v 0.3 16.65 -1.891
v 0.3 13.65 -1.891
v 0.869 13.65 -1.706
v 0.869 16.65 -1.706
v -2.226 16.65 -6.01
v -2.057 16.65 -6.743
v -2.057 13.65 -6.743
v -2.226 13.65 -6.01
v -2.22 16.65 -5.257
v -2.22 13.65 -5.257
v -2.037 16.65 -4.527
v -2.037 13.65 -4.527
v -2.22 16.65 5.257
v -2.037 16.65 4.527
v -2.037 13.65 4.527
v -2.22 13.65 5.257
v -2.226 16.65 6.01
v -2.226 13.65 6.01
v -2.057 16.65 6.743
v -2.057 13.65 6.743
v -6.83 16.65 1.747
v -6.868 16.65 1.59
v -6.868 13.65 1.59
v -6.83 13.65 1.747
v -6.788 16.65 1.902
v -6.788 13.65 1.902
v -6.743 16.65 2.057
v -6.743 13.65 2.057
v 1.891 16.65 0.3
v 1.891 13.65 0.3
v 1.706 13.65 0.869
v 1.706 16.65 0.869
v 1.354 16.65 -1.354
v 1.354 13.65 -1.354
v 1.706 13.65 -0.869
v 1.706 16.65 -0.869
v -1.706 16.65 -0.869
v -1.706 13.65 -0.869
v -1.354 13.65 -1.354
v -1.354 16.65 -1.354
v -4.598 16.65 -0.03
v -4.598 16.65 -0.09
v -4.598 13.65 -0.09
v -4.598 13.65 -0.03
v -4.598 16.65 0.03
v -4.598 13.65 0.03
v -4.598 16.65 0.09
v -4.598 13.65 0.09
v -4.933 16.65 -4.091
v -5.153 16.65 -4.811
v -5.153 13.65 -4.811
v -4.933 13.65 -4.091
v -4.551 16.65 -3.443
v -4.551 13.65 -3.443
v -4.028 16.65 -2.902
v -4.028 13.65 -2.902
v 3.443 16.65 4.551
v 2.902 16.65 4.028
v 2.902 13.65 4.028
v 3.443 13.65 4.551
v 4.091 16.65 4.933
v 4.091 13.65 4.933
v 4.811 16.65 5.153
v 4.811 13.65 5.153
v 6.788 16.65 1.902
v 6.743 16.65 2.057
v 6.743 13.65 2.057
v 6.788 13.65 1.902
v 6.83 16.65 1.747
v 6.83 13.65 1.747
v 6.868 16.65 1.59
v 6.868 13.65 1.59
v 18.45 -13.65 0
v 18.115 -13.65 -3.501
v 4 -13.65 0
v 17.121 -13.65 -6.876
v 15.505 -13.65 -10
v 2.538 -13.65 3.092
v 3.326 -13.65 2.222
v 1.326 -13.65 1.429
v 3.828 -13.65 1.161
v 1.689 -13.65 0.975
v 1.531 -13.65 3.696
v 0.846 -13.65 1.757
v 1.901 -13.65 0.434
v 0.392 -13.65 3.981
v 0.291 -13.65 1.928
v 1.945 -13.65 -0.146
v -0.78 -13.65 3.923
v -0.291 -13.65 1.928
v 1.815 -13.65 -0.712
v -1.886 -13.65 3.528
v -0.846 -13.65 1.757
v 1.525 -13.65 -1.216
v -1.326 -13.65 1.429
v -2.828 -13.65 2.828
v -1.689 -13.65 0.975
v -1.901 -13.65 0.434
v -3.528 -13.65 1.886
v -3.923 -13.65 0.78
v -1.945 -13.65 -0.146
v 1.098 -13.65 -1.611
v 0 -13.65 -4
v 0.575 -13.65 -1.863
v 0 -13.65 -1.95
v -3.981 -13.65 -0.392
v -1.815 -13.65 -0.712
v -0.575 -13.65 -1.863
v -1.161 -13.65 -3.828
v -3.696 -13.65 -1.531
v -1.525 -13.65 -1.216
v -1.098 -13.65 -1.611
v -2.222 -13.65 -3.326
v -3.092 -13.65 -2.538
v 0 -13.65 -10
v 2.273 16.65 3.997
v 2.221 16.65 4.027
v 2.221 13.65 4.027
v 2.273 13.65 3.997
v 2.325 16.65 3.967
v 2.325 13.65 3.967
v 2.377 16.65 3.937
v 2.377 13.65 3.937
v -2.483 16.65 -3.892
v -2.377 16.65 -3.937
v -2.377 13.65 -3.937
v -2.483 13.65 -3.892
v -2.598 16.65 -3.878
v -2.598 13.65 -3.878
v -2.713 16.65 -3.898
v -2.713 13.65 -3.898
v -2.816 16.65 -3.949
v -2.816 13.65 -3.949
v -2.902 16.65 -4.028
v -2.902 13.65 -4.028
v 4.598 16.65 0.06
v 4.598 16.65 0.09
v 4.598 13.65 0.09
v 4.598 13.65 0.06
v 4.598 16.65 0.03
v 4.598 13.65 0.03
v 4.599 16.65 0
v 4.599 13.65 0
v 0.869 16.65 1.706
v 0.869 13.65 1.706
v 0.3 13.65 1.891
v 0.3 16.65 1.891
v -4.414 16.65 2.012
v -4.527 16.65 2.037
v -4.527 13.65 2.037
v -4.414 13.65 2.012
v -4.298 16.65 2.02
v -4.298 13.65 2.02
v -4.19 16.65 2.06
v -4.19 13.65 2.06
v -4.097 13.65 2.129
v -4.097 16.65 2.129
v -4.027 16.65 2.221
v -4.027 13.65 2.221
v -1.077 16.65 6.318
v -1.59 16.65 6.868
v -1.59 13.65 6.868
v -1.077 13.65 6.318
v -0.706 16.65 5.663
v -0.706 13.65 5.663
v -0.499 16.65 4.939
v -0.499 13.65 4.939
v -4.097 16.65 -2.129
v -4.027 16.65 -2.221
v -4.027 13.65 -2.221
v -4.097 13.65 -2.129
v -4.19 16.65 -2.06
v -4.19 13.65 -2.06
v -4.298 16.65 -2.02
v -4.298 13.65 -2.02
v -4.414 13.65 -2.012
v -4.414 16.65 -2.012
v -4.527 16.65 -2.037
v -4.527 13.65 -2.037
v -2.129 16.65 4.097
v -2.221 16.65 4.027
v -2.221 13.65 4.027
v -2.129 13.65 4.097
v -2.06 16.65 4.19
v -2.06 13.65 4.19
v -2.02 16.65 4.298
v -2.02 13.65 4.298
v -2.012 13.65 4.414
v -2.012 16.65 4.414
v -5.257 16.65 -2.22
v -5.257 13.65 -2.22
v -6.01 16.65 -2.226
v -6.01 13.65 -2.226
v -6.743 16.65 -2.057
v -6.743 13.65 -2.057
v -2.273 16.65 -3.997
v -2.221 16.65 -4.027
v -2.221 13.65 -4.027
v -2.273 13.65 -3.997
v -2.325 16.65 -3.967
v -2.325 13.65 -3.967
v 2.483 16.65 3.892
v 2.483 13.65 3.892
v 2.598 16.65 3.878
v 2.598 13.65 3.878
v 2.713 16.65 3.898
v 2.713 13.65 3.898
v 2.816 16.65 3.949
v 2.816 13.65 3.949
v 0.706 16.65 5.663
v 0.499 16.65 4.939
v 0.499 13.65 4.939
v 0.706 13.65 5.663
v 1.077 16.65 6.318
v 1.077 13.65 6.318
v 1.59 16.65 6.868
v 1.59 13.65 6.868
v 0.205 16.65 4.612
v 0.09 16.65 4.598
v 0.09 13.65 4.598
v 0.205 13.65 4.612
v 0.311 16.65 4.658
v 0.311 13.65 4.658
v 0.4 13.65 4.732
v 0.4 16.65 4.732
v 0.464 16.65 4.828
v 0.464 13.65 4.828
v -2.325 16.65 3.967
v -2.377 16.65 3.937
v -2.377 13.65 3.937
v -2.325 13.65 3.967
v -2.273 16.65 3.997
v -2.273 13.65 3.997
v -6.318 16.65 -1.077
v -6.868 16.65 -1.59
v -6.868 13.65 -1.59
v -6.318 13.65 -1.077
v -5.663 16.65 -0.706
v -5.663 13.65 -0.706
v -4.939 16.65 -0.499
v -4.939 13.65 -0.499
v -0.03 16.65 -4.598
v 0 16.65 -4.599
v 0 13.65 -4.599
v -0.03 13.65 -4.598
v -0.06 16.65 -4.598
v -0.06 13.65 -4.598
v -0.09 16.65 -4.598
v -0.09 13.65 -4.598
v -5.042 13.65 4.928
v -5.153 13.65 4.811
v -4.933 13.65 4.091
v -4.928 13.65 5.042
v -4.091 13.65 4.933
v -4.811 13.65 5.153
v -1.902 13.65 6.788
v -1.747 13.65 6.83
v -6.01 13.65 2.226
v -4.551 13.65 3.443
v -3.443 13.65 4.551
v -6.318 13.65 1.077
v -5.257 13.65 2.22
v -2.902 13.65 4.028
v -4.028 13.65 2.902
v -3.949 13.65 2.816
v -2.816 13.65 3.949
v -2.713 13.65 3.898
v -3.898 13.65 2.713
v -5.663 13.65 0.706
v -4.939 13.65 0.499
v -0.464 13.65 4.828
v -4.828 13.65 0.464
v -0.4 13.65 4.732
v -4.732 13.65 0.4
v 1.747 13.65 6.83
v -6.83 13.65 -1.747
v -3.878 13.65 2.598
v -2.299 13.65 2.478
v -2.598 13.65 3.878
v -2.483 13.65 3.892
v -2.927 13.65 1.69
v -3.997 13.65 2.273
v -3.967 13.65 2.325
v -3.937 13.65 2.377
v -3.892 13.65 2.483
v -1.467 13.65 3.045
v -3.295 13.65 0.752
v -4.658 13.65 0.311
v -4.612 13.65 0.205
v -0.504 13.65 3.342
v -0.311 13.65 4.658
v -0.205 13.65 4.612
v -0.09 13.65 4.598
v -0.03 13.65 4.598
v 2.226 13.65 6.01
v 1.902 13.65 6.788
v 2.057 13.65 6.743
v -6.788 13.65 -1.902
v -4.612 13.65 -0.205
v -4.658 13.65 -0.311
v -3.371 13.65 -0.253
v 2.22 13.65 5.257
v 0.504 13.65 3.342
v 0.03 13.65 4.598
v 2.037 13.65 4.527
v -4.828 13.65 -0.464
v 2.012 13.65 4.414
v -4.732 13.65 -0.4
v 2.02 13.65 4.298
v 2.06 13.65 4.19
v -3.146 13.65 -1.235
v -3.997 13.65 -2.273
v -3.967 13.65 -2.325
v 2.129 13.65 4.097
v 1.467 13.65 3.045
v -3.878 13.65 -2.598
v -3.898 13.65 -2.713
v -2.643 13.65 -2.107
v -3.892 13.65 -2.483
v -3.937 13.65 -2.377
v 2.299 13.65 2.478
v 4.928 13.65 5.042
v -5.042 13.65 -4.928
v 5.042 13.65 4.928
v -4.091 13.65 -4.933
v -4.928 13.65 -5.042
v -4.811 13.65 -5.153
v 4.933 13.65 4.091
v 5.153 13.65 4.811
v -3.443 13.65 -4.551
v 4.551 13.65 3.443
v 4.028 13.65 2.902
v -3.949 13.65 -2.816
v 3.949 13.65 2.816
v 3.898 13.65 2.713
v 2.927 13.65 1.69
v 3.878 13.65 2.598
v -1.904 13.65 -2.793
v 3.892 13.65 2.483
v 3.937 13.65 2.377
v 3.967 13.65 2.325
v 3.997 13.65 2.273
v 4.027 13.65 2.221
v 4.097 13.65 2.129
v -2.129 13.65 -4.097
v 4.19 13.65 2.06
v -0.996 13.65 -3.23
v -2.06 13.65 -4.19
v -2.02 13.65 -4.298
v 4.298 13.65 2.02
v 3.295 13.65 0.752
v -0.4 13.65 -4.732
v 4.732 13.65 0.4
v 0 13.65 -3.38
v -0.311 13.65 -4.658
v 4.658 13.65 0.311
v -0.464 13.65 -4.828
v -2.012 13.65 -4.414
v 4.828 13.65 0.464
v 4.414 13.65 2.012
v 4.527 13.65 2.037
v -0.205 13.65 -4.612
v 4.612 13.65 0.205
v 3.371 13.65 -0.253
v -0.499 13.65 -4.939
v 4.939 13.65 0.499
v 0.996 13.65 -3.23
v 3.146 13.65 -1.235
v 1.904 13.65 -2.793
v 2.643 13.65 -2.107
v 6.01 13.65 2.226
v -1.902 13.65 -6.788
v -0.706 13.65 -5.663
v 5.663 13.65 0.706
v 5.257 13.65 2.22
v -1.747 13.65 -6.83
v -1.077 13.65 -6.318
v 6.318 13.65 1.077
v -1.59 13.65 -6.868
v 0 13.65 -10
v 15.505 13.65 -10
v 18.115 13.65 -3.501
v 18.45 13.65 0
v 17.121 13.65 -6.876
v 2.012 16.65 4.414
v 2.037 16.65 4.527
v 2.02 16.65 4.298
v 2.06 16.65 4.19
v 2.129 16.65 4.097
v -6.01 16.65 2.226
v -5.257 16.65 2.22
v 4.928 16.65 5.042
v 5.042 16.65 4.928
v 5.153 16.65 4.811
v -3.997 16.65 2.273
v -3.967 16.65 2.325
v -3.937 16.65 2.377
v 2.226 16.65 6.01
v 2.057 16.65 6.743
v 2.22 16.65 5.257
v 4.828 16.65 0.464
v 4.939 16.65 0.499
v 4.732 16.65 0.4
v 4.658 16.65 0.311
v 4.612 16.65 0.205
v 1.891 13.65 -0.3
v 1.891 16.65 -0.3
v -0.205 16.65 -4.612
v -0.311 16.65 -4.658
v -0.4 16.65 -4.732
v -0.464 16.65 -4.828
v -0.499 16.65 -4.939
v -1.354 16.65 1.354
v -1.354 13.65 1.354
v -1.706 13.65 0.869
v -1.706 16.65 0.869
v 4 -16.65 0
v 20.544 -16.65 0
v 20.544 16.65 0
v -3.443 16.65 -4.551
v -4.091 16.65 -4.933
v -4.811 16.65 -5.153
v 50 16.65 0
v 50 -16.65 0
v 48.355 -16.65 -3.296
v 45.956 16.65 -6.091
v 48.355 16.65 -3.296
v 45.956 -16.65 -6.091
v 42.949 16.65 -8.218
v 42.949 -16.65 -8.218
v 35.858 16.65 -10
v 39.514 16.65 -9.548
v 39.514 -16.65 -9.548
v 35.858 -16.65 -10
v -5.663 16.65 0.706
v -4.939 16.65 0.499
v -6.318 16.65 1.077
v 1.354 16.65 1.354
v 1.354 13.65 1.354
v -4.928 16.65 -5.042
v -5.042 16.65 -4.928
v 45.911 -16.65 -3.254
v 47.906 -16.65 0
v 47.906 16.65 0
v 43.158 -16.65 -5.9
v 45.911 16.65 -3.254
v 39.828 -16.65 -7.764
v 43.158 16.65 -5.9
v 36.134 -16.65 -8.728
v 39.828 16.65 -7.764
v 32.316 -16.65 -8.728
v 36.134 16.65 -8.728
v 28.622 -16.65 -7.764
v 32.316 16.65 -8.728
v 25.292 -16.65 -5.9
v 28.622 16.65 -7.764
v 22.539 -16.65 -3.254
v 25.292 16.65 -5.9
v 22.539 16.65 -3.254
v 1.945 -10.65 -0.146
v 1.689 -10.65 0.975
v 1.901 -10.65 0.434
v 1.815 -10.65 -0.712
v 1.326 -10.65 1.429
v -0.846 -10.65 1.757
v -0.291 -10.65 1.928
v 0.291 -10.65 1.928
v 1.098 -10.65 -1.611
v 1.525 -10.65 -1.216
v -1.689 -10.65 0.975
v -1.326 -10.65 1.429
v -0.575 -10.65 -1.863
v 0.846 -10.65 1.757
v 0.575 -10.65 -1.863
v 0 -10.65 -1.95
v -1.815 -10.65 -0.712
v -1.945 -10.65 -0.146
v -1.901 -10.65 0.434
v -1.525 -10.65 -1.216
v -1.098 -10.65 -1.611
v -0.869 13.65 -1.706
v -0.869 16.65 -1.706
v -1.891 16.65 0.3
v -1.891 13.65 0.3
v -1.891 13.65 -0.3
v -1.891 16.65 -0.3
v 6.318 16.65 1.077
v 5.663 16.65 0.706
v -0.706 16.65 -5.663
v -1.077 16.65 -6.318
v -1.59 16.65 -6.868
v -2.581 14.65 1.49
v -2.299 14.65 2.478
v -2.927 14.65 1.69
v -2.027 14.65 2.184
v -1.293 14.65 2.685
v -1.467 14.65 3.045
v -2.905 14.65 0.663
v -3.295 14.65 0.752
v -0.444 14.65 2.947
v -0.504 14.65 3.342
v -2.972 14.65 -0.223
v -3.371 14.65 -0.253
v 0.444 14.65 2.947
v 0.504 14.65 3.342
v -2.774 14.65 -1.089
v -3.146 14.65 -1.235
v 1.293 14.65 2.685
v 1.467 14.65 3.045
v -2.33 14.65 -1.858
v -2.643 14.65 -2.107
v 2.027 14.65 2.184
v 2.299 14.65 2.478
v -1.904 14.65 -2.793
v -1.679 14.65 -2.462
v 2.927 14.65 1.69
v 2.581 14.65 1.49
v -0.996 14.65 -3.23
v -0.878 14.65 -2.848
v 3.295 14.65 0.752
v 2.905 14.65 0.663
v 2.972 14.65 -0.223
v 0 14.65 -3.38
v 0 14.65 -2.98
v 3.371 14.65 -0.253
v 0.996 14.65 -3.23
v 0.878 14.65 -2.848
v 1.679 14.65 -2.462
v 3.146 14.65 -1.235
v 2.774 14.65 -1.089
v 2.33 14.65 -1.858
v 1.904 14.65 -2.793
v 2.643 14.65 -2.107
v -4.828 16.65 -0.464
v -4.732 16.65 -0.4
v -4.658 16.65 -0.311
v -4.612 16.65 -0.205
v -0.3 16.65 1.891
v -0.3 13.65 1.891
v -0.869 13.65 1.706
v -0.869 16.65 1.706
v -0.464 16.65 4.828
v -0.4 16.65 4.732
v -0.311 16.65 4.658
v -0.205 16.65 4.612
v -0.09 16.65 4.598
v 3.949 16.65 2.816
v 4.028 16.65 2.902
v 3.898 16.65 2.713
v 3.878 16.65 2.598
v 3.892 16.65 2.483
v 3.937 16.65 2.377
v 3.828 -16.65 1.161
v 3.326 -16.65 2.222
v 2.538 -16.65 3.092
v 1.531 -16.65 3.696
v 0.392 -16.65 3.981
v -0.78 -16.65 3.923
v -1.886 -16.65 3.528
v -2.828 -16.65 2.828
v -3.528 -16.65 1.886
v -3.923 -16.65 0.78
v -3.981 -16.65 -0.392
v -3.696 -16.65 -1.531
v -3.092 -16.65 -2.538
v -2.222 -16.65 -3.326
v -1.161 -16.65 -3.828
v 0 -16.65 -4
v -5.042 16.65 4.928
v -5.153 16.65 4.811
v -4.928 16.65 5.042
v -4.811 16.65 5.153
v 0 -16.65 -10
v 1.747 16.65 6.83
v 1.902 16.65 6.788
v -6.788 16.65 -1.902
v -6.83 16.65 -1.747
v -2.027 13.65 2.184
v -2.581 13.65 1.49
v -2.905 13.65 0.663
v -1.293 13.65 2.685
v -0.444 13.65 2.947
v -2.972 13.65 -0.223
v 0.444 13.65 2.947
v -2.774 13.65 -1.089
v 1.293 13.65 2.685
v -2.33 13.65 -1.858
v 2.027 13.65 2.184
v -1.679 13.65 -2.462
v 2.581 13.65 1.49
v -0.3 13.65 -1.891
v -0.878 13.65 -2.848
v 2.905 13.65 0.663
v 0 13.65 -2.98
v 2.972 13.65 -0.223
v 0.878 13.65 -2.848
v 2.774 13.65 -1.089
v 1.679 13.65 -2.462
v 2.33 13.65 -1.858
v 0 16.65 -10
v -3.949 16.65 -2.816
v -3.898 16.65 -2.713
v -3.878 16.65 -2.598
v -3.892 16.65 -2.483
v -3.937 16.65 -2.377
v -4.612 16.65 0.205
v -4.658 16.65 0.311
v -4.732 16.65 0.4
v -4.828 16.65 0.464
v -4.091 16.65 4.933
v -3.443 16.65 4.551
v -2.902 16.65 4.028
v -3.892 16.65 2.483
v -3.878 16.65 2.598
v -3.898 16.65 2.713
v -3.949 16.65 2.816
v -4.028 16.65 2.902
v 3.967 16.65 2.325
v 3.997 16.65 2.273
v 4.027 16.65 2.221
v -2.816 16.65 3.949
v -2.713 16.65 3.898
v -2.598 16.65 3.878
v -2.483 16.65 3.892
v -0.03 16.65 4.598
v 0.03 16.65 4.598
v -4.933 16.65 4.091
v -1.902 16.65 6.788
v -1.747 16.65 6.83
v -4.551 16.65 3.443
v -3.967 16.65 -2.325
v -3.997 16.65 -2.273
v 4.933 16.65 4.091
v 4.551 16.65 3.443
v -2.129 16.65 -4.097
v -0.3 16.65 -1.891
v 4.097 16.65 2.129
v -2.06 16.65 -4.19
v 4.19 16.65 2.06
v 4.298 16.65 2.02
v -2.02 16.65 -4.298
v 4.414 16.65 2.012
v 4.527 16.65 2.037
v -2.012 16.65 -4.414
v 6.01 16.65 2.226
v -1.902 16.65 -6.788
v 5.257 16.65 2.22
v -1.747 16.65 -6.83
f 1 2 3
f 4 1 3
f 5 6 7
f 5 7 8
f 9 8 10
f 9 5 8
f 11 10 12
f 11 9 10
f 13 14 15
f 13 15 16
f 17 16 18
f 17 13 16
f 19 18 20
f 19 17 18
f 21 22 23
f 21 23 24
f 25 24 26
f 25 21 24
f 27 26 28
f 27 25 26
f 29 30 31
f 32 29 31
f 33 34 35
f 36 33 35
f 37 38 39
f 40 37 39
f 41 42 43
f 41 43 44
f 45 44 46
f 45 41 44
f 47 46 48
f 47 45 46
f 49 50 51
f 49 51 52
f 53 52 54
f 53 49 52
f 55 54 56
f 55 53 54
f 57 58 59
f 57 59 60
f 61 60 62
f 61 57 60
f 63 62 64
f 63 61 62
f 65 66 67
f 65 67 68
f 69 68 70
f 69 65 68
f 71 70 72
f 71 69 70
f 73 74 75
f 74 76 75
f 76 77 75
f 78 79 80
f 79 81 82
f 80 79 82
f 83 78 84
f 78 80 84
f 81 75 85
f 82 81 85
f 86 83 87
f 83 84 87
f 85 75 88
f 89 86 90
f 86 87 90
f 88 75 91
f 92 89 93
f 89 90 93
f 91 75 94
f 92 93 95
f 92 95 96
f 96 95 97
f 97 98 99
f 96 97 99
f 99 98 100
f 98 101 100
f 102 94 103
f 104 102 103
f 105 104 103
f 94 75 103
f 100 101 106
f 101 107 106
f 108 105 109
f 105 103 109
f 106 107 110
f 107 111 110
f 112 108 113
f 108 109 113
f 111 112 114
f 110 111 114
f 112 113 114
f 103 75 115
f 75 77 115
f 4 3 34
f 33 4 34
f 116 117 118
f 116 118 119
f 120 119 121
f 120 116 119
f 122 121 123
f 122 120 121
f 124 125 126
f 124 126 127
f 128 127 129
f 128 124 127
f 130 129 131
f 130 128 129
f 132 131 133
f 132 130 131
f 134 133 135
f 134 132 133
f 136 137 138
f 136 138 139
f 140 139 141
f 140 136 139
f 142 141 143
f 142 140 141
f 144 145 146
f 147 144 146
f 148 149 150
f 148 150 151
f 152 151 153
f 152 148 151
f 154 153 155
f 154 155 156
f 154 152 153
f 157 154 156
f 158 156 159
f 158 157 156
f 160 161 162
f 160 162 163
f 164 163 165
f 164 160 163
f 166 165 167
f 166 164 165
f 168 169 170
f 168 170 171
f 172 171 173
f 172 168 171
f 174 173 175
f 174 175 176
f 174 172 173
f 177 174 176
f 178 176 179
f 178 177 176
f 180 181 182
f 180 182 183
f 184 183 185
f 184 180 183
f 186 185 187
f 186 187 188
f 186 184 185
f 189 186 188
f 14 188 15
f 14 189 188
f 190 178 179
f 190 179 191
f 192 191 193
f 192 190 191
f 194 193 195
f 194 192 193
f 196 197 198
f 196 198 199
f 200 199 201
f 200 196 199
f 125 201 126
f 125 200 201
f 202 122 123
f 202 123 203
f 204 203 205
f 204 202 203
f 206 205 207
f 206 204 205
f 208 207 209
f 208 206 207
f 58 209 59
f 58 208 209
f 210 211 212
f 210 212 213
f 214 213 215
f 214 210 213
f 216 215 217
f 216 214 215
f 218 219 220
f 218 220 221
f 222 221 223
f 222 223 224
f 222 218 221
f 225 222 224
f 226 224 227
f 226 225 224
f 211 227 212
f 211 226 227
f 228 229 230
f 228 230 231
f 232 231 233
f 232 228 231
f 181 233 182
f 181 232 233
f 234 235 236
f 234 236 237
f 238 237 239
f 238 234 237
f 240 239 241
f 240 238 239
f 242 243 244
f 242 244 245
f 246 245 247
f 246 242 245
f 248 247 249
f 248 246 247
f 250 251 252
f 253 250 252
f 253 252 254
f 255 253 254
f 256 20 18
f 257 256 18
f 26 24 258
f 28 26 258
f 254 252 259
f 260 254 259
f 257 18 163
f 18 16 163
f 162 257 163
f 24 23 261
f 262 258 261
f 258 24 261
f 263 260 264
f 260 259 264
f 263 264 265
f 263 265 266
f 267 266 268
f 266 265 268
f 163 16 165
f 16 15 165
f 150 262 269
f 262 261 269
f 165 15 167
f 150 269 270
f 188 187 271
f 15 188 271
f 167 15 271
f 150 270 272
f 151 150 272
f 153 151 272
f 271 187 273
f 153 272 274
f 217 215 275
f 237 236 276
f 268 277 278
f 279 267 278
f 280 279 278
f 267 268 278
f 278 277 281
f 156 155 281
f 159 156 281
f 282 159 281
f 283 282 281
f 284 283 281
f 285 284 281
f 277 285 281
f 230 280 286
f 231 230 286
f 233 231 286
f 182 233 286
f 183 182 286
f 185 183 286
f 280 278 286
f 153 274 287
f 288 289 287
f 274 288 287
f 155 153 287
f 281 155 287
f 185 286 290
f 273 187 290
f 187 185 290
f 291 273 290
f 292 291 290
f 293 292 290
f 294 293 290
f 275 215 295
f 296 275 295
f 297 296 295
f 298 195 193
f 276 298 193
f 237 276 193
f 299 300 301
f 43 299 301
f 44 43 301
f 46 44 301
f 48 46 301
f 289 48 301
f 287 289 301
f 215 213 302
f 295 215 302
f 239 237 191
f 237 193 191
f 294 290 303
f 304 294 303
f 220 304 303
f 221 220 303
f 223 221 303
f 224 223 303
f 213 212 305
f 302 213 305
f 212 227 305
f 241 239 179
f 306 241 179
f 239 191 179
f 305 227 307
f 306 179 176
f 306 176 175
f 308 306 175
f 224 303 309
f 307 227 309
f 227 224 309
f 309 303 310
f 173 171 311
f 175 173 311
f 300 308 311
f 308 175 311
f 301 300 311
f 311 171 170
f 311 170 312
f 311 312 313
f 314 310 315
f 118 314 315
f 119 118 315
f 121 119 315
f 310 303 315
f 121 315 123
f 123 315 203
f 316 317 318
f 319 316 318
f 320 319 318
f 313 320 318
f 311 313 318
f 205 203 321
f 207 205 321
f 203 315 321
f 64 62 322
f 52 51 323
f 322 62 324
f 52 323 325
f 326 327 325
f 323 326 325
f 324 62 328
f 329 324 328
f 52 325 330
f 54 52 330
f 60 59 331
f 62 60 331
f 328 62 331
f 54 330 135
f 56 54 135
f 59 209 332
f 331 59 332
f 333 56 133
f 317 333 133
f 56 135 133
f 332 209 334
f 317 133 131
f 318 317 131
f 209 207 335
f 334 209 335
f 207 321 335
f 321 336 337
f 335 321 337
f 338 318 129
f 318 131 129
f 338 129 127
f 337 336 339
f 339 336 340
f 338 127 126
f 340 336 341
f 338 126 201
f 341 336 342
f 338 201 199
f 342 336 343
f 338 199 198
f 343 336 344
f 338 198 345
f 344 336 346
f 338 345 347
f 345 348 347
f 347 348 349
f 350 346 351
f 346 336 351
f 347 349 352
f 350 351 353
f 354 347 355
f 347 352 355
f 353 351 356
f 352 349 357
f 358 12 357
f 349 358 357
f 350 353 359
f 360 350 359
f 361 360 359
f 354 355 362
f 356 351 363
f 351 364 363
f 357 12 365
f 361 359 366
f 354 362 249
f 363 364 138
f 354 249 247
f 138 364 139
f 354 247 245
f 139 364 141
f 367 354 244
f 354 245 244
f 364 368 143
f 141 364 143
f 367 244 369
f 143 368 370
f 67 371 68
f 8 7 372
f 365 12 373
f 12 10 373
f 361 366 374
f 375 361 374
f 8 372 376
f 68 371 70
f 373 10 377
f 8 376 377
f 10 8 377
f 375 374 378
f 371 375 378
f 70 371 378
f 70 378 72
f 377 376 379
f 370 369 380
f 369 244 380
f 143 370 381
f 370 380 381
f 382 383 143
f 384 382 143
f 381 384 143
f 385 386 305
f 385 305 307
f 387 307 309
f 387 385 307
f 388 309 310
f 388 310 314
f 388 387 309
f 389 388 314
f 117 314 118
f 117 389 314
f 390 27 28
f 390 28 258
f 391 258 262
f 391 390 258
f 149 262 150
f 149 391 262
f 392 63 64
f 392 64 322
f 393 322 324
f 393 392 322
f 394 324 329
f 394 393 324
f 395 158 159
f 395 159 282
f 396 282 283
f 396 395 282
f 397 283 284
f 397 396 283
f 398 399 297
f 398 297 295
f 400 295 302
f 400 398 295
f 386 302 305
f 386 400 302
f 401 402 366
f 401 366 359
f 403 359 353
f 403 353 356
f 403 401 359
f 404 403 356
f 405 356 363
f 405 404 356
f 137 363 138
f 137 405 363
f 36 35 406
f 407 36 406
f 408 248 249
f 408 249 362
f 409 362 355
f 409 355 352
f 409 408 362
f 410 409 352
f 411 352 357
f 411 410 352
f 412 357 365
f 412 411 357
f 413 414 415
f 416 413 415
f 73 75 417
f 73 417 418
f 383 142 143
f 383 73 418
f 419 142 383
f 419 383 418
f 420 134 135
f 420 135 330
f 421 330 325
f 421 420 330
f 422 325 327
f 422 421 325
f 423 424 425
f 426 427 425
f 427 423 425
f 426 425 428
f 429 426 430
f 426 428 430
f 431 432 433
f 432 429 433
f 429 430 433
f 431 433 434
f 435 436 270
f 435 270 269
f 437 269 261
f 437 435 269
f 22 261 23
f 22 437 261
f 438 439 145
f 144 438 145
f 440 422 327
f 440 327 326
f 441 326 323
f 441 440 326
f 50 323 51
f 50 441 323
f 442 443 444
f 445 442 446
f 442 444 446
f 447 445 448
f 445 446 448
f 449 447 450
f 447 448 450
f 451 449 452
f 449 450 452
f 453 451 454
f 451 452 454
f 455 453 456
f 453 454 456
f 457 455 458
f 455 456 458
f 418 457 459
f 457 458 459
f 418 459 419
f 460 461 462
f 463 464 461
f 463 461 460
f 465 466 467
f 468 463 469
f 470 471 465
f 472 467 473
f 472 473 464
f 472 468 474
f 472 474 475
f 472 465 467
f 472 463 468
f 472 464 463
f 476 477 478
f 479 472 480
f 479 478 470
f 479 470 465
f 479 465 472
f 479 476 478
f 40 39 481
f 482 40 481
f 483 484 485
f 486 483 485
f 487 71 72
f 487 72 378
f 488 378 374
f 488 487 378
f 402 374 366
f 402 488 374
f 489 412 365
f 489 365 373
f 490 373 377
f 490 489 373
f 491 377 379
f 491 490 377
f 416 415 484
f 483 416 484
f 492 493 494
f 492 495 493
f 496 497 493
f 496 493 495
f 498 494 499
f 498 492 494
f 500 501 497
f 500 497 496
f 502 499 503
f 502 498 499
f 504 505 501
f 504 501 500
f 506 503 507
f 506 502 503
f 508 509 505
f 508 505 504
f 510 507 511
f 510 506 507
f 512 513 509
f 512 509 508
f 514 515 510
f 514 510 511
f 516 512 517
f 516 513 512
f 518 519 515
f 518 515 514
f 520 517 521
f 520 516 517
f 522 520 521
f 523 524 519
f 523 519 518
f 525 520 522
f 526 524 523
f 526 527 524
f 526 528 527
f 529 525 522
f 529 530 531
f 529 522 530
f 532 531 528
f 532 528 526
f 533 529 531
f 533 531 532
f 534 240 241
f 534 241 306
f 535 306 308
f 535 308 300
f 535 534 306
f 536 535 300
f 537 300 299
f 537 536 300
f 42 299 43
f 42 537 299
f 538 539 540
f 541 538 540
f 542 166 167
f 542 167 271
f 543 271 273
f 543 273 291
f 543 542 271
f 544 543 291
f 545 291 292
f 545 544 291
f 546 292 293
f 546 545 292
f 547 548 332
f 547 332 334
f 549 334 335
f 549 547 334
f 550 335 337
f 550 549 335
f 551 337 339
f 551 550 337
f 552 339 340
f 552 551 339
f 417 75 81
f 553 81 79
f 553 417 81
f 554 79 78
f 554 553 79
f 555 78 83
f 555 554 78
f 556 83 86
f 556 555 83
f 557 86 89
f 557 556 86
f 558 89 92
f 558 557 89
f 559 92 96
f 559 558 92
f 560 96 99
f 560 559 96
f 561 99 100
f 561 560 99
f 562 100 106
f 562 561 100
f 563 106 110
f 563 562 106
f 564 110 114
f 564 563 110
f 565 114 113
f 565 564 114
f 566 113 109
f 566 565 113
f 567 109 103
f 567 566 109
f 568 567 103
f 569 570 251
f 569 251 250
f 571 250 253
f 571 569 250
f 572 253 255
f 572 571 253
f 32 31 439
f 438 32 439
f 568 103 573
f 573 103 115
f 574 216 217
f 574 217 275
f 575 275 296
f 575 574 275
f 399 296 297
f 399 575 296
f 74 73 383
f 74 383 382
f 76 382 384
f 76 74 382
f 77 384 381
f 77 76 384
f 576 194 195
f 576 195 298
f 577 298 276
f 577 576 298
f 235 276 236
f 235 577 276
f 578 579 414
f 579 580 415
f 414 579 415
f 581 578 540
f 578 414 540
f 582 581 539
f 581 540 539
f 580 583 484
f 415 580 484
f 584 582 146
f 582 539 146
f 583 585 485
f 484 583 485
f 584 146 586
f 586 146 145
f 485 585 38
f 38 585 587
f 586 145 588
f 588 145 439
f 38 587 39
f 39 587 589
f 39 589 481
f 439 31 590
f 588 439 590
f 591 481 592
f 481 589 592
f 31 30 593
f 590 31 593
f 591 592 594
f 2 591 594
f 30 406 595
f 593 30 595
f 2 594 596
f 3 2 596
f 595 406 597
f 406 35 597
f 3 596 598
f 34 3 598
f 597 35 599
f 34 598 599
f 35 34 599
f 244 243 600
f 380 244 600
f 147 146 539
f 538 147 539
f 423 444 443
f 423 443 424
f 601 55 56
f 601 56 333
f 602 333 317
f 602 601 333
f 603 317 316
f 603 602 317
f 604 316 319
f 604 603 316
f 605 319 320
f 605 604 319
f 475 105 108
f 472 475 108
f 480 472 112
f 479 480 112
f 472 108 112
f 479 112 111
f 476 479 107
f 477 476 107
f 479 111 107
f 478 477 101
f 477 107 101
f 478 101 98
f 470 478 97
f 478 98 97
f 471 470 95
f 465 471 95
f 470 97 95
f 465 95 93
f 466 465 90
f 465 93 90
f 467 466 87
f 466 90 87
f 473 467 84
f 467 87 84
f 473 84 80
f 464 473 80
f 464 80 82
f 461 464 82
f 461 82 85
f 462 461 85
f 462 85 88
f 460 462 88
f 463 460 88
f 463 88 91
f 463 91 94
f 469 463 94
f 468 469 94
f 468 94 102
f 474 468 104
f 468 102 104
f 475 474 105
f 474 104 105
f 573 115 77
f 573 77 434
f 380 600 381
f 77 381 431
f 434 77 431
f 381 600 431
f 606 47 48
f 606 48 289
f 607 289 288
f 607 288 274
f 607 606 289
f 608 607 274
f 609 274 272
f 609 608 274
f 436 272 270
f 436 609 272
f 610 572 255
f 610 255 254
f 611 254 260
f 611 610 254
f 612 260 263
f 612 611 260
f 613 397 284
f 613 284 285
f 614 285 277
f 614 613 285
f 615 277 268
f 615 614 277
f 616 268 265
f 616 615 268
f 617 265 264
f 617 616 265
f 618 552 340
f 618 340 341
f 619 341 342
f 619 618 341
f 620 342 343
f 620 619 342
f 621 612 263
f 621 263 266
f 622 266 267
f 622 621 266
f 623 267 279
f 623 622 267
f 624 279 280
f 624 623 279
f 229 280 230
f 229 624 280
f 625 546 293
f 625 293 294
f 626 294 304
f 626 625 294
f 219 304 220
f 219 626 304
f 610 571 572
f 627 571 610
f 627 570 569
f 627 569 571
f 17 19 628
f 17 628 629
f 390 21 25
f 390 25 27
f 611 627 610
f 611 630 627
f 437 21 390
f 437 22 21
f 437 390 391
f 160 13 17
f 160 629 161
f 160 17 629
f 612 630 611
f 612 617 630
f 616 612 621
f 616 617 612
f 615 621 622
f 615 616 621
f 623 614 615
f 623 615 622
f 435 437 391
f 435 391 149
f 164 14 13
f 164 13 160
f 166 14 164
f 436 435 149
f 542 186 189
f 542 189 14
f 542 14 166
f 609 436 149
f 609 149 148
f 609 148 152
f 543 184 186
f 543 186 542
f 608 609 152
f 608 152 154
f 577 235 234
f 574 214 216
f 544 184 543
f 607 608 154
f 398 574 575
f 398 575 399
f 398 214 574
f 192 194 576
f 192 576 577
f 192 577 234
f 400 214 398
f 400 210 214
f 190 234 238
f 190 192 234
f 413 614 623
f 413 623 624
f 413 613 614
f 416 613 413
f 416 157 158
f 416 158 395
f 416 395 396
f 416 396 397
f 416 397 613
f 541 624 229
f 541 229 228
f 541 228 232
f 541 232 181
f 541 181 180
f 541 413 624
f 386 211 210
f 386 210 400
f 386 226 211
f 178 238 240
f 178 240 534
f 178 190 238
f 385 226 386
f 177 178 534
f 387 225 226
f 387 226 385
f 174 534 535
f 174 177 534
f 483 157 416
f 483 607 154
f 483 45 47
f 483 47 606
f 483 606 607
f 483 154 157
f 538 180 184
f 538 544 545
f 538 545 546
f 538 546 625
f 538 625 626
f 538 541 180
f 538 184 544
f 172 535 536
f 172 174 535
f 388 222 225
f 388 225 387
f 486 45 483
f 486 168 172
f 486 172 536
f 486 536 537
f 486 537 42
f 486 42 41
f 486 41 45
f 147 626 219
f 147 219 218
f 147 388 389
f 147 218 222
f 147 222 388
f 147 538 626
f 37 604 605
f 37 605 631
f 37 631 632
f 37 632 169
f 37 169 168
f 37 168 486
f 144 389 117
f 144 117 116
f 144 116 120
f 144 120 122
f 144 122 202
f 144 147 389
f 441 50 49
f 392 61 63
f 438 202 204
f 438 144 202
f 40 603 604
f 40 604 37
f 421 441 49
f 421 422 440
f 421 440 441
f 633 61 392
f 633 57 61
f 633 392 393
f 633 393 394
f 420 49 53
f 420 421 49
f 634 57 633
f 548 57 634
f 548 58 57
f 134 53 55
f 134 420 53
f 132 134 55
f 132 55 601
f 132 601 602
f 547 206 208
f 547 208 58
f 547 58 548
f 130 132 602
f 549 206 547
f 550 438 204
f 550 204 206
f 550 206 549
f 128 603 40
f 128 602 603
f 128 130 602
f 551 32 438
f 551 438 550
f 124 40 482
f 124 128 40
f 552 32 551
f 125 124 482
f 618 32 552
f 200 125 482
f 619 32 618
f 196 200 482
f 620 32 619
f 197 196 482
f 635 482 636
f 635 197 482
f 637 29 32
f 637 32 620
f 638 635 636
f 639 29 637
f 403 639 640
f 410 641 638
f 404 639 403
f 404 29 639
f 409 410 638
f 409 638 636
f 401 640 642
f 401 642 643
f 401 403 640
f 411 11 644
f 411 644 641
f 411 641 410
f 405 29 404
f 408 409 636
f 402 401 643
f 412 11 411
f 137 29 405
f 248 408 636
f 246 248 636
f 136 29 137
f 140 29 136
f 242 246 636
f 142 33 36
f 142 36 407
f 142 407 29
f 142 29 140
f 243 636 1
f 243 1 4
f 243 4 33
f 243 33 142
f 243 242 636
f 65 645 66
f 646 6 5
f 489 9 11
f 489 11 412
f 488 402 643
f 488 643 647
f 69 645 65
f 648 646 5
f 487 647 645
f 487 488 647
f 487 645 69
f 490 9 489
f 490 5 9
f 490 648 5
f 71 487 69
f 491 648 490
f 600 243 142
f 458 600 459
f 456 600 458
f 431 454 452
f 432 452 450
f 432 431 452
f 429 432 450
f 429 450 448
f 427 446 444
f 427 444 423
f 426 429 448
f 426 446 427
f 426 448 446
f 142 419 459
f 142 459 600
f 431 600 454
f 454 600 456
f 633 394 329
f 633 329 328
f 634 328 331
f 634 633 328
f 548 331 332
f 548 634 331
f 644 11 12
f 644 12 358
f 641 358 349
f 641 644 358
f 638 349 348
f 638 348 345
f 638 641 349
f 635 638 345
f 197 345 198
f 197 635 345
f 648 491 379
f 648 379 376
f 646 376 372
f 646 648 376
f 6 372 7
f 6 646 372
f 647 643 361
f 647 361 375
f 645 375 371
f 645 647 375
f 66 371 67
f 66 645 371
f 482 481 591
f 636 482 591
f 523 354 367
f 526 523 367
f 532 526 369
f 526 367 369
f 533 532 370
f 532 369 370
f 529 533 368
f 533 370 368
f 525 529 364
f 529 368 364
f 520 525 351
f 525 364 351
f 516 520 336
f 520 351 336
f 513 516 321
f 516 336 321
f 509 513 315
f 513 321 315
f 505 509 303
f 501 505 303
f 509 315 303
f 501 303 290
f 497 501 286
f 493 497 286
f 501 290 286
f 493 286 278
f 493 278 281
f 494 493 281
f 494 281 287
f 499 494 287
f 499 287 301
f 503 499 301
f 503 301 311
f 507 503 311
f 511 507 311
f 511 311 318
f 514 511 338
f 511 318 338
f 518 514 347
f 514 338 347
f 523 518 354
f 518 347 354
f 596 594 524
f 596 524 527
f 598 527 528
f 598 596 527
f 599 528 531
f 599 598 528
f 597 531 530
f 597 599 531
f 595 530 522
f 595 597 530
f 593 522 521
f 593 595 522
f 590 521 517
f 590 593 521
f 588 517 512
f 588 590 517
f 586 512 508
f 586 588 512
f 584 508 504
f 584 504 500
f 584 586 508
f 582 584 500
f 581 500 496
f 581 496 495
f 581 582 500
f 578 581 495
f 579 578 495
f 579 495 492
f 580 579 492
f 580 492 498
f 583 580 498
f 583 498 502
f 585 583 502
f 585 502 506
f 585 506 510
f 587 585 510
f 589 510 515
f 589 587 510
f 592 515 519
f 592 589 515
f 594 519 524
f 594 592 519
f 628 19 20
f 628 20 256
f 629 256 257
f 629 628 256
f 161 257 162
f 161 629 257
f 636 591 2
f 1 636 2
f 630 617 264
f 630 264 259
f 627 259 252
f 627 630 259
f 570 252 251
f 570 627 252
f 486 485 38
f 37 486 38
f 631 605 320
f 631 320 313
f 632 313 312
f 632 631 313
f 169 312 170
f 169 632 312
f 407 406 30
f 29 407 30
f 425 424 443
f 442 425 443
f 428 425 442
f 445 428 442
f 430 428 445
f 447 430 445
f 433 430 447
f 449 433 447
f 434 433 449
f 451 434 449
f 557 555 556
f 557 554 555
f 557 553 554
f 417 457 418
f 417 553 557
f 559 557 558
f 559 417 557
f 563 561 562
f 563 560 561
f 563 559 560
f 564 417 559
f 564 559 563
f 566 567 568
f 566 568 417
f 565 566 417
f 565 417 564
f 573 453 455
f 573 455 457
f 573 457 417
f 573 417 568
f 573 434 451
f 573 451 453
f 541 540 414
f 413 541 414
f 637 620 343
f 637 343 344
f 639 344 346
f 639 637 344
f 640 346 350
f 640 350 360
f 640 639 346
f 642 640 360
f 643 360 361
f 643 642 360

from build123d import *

# Parameters (mm, degrees)
SKETCH1_W           = 50
SKETCH1_H           = 10
BOSS_EXTRUDE2_DEPTH = 16.65
CUT_EXTRUDE1_START  = -27.3
SKETCH2_R           = 18.45
CUT_EXTRUDE1_DEPTH  = 27.3
SKETCH3_R           = 4
BOSS_EXTRUDE3_DEPTH = 3
CUT_EXTRUDE2_DEPTH  = 3
BOSS_EXTRUDE4_START = 3
SKETCH5_R           = 4
BOSS_EXTRUDE4_DEPTH = 3
SKETCH6_R           = 1.95
BOSS_EXTRUDE5_DEPTH = 3
BOSS_EXTRUDE6_DEPTH = 3
SKETCH9_R           = 3.38
SKETCH9_R_2         = 2.98
CUT_EXTRUDE3_DEPTH  = 1
SKETCH10_R          = 15
CUT_EXTRUDE4_DEPTH  = 61.900656811
FILLET1_R           = 15


with BuildPart() as part:
    # Sketch1 → Boss-Extrude2 (new, symmetric)
    with BuildSketch(Plane(origin=(0, 0, 0), x_dir=(1, 0, 0), z_dir=(0, 1, 0))):
        with Locations((25, 5)):
            Rectangle(SKETCH1_W, SKETCH1_H)
    extrude(amount=BOSS_EXTRUDE2_DEPTH, both=True)

    # Sketch2 → Cut-Extrude1 (cut)
    with BuildSketch(Plane(origin=(0, 13.65, 0), x_dir=(1, 0, 0), z_dir=(0, 1, 0)).offset(CUT_EXTRUDE1_START)):
        Circle(SKETCH2_R)
    extrude(amount=CUT_EXTRUDE1_DEPTH, mode=Mode.SUBTRACT)

    # Sketch3 → Boss-Extrude3 (add)
    with BuildSketch(Plane(origin=(0, 13.65, 0), x_dir=(1, 0, 0), z_dir=(0, 1, 0))):
        Circle(SKETCH3_R)
    extrude(amount=BOSS_EXTRUDE3_DEPTH)

    # Sketch4 → Cut-Extrude2 (cut)
    with BuildSketch(Plane.XZ.offset(-13.65)):
        Polygon((0.869391807, 1.706277494), (0.299572001, 1.891423172), (-0.299572001, 1.891423172), (-0.869391807, 1.706277494), (-1.354109486, 1.354109486), (-1.706277494, 0.869391807), (-1.891423172, 0.299572001), (-1.891423172, -0.299572001), (-1.706277494, -0.869391807), (-1.354109486, -1.354109486), (-0.869391807, -1.706277494), (-0.299572001, -1.891423172), (0.299572001, -1.891423172), (0.869391807, -1.706277494), (1.354109486, -1.354109486), (1.706277494, -0.869391807), (1.891423172, -0.299572001), (1.891423172, 0.299572001), (1.706277494, 0.869391807), (1.354109486, 1.354109486), align=None)
    extrude(amount=-CUT_EXTRUDE2_DEPTH, mode=Mode.SUBTRACT)

    # Sketch5 → Boss-Extrude4 (add)
    with BuildSketch(Plane(origin=(0, -13.65, 0), x_dir=(-1, 0, 0), z_dir=(0, -1, 0)).offset(BOSS_EXTRUDE4_START)):
        Circle(SKETCH5_R)
    extrude(amount=-BOSS_EXTRUDE4_DEPTH)

    # Sketch6 → Boss-Extrude5 (add)
    with BuildSketch(Plane(origin=(0, -13.65, 0), x_dir=(1, 0, 0), z_dir=(0, 1, 0))):
        with Locations(Location((0, 0, 0), (0, 0, 90))):
            Circle(SKETCH6_R)
    extrude(amount=BOSS_EXTRUDE5_DEPTH)

    # Sketch7 → Boss-Extrude6 (add)
    with BuildSketch(Plane(origin=(0, 16.65, 0), x_dir=(1, 0, 0), z_dir=(0, 1, 0))):
        with BuildLine():
            ThreePointArc((2.037195172, -4.526756305), (2.035703314, -4.242437448), (2.220911486, -4.026712227))
            ThreePointArc((2.220911486, -4.026712227), (2.299285714, -3.982479678), (2.376779339, -3.93672188))
            ThreePointArc((2.376779339, -3.93672188), (2.656206947, -3.884189508), (2.901688371, -4.027640924))
            ThreePointArc((2.901688371, -4.027640924), (3.755891391, -4.760966743), (4.811166064, -5.153171946))
            ThreePointArc((4.811166064, -5.153171946), (4.985102807, -4.985102807), (5.153171946, -4.811166064))
            ThreePointArc((5.153171946, -4.811166064), (4.760966743, -3.755891391), (4.027640924, -2.901688371))
            ThreePointArc((4.027640924, -2.901688371), (3.884189508, -2.656206947), (3.93672188, -2.376779339))
            ThreePointArc((3.93672188, -2.376779339), (3.982479678, -2.299285714), (4.026712227, -2.220911486))
            ThreePointArc((4.026712227, -2.220911486), (4.242437448, -2.035703314), (4.526756305, -2.037195172))
            ThreePointArc((4.526756305, -2.037195172), (5.63318073, -2.24517245), (6.743178006, -2.057194784))
            ThreePointArc((6.743178006, -2.057194784), (6.809777075, -1.824674268), (6.868360847, -1.59000606))
            ThreePointArc((6.868360847, -1.59000606), (6.001063841, -0.872213987), (4.938883542, -0.499115381))
            ThreePointArc((4.938883542, -0.499115381), (4.69191026, -0.35824794), (4.597690825, -0.089990347))
            ThreePointArc((4.597690825, -0.089990347), (4.598571429, 0), (4.597690825, 0.089990347))
            ThreePointArc((4.597690825, 0.089990347), (4.69191026, 0.35824794), (4.938883542, 0.499115381))
            ThreePointArc((4.938883542, 0.499115381), (6.001063841, 0.872213987), (6.868360847, 1.59000606))
            ThreePointArc((6.868360847, 1.59000606), (6.809777075, 1.824674268), (6.743178006, 2.057194784))
            ThreePointArc((6.743178006, 2.057194784), (5.63318073, 2.24517245), (4.526756305, 2.037195172))
            ThreePointArc((4.526756305, 2.037195172), (4.242437448, 2.035703314), (4.026712227, 2.220911486))
            ThreePointArc((4.026712227, 2.220911486), (3.982479678, 2.299285714), (3.93672188, 2.376779339))
            ThreePointArc((3.93672188, 2.376779339), (3.884189508, 2.656206947), (4.027640924, 2.901688371))
            ThreePointArc((4.027640924, 2.901688371), (4.760966743, 3.755891391), (5.153171946, 4.811166064))
            ThreePointArc((5.153171946, 4.811166064), (4.985102807, 4.985102807), (4.811166064, 5.153171946))
            ThreePointArc((4.811166064, 5.153171946), (3.755891391, 4.760966743), (2.901688371, 4.027640924))
            ThreePointArc((2.901688371, 4.027640924), (2.656206947, 3.884189508), (2.376779339, 3.93672188))
            ThreePointArc((2.376779339, 3.93672188), (2.299285714, 3.982479678), (2.220911486, 4.026712227))
            ThreePointArc((2.220911486, 4.026712227), (2.035703314, 4.242437448), (2.037195172, 4.526756305))
            ThreePointArc((2.037195172, 4.526756305), (2.24517245, 5.63318073), (2.057194784, 6.743178006))
            ThreePointArc((2.057194784, 6.743178006), (1.824674268, 6.809777075), (1.59000606, 6.868360847))
            ThreePointArc((1.59000606, 6.868360847), (0.872213987, 6.001063841), (0.499115381, 4.938883542))
            ThreePointArc((0.499115381, 4.938883542), (0.35824794, 4.69191026), (0.089990347, 4.597690825))
            ThreePointArc((0.089990347, 4.597690825), (0, 4.598571429), (-0.089990347, 4.597690825))
            ThreePointArc((-0.089990347, 4.597690825), (-0.35824794, 4.69191026), (-0.499115381, 4.938883542))
            ThreePointArc((-0.499115381, 4.938883542), (-0.872213987, 6.001063841), (-1.59000606, 6.868360847))
            ThreePointArc((-1.59000606, 6.868360847), (-1.824674268, 6.809777075), (-2.057194784, 6.743178006))
            ThreePointArc((-2.057194784, 6.743178006), (-2.24517245, 5.63318073), (-2.037195172, 4.526756305))
            ThreePointArc((-2.037195172, 4.526756305), (-2.035703314, 4.242437448), (-2.220911486, 4.026712227))
            ThreePointArc((-2.220911486, 4.026712227), (-2.299285714, 3.982479678), (-2.376779339, 3.93672188))
            ThreePointArc((-2.376779339, 3.93672188), (-2.656206947, 3.884189508), (-2.901688371, 4.027640924))
            ThreePointArc((-2.901688371, 4.027640924), (-3.755891391, 4.760966743), (-4.811166064, 5.153171946))
            ThreePointArc((-4.811166064, 5.153171946), (-4.985102807, 4.985102807), (-5.153171946, 4.811166064))
            ThreePointArc((-5.153171946, 4.811166064), (-4.760966743, 3.755891391), (-4.027640924, 2.901688371))
            ThreePointArc((-4.027640924, 2.901688371), (-3.884189508, 2.656206947), (-3.93672188, 2.376779339))
            ThreePointArc((-3.93672188, 2.376779339), (-3.982479678, 2.299285714), (-4.026712227, 2.220911486))
            ThreePointArc((-4.026712227, 2.220911486), (-4.242437448, 2.035703314), (-4.526756305, 2.037195172))
            ThreePointArc((-4.526756305, 2.037195172), (-5.63318073, 2.24517245), (-6.743178006, 2.057194784))
            ThreePointArc((-6.743178006, 2.057194784), (-6.809777075, 1.824674268), (-6.868360847, 1.59000606))
            ThreePointArc((-6.868360847, 1.59000606), (-6.001063841, 0.872213987), (-4.938883542, 0.499115381))
            ThreePointArc((-4.938883542, 0.499115381), (-4.69191026, 0.35824794), (-4.597690825, 0.089990347))
            ThreePointArc((-4.597690825, 0.089990347), (-4.598571429, 0), (-4.597690825, -0.089990347))
            ThreePointArc((-4.597690825, -0.089990347), (-4.69191026, -0.35824794), (-4.938883542, -0.499115381))
            ThreePointArc((-4.938883542, -0.499115381), (-6.001063841, -0.872213987), (-6.868360847, -1.59000606))
            ThreePointArc((-6.868360847, -1.59000606), (-6.809777075, -1.824674268), (-6.743178006, -2.057194784))
            ThreePointArc((-6.743178006, -2.057194784), (-5.63318073, -2.24517245), (-4.526756305, -2.037195172))
            ThreePointArc((-4.526756305, -2.037195172), (-4.242437448, -2.035703314), (-4.026712227, -2.220911486))
            ThreePointArc((-4.026712227, -2.220911486), (-3.982479678, -2.299285714), (-3.93672188, -2.376779339))
            ThreePointArc((-3.93672188, -2.376779339), (-3.884189508, -2.656206947), (-4.027640924, -2.901688371))
            ThreePointArc((-4.027640924, -2.901688371), (-4.760966743, -3.755891391), (-5.153171946, -4.811166064))
            ThreePointArc((-5.153171946, -4.811166064), (-4.985102807, -4.985102807), (-4.811166064, -5.153171946))
            ThreePointArc((-4.811166064, -5.153171946), (-3.755891391, -4.760966743), (-2.901688371, -4.027640924))
            ThreePointArc((-2.901688371, -4.027640924), (-2.656206947, -3.884189508), (-2.376779339, -3.93672188))
            ThreePointArc((-2.376779339, -3.93672188), (-2.299285714, -3.982479678), (-2.220911486, -4.026712227))
            ThreePointArc((-2.220911486, -4.026712227), (-2.035703314, -4.242437448), (-2.037195172, -4.526756305))
            ThreePointArc((-2.037195172, -4.526756305), (-2.24517245, -5.63318073), (-2.057194784, -6.743178006))
            ThreePointArc((-2.057194784, -6.743178006), (-1.824674268, -6.809777075), (-1.59000606, -6.868360847))
            ThreePointArc((-1.59000606, -6.868360847), (-0.872213987, -6.001063841), (-0.499115381, -4.938883542))
            ThreePointArc((-0.499115381, -4.938883542), (-0.35824794, -4.69191026), (-0.089990347, -4.597690825))
            ThreePointArc((-0.089990347, -4.597690825), (0, -4.598571429), (0.089990347, -4.597690825))
            ThreePointArc((0.089990347, -4.597690825), (0.35824794, -4.69191026), (0.499115381, -4.938883542))
            ThreePointArc((0.499115381, -4.938883542), (0.872213987, -6.001063841), (1.59000606, -6.868360847))
            ThreePointArc((1.59000606, -6.868360847), (1.824674268, -6.809777075), (2.057194784, -6.743178006))
            ThreePointArc((2.057194784, -6.743178006), (2.24517245, -5.63318073), (2.037195172, -4.526756305))
        make_face()
        Polygon((1.706277494, -0.869391807), (1.354109486, -1.354109486), (0.869391807, -1.706277494), (0.299572001, -1.891423172), (-0.299572001, -1.891423172), (-0.869391807, -1.706277494), (-1.354109486, -1.354109486), (-1.706277494, -0.869391807), (-1.891423172, -0.299572001), (-1.891423172, 0.299572001), (-1.706277494, 0.869391807), (-1.354109486, 1.354109486), (-0.869391807, 1.706277494), (-0.299572001, 1.891423172), (0.299572001, 1.891423172), (0.869391807, 1.706277494), (1.354109486, 1.354109486), (1.706277494, 0.869391807), (1.891423172, 0.299572001), (1.891423172, -0.299572001), align=None, mode=Mode.SUBTRACT)
    extrude(amount=-BOSS_EXTRUDE6_DEPTH)

    # Sketch9 → Cut-Extrude3 (cut)
    with BuildSketch(Plane.XZ.offset(-13.65)):
        with Locations(Location((0, 0, 0), (0, 0, 270))):
            Circle(SKETCH9_R)
        with Locations(Location((0, 0, 0), (0, 0, 270))):
            Circle(SKETCH9_R_2, mode=Mode.SUBTRACT)
    extrude(amount=-CUT_EXTRUDE3_DEPTH, mode=Mode.SUBTRACT)

    # Sketch10 → Cut-Extrude4 (cut, through all)
    with BuildSketch(Plane(origin=(0, 16.65, 0), x_dir=(1, 0, 0), z_dir=(0, 1, 0))):
        with Locations((34.225, -6.15)):
            Circle(SKETCH10_R)
    extrude(amount=-CUT_EXTRUDE4_DEPTH, mode=Mode.SUBTRACT)

    # Fillet1
    # the kernel refuses this fillet: 15 mm, written as the material it takes off along each edge
    with BuildSketch(Plane(origin=(50, -52.005339059, -10), x_dir=(-1, 0, 0), z_dir=(0, 1, 0))) as fillet1_piece_1:
        with BuildLine():
            CenterArc((14.142135624, 15), FILLET1_R, 199.471220634, 70.528779366)
            Line((0, 10), (-0.282842712, 9.9))
            ThreePointArc((-0.282842712, 9.9), (-0.3, 5), (-0.3, 0))
            Line((-0.3, 0), (0, -0.3))
            Line((0, -0.3), (14.142135624, -0.3))
            Line((14.142135624, -0.3), (14.142135624, 0))
        make_face()
    extrude(amount=104.010678119, mode=Mode.SUBTRACT)


solid = part.part
